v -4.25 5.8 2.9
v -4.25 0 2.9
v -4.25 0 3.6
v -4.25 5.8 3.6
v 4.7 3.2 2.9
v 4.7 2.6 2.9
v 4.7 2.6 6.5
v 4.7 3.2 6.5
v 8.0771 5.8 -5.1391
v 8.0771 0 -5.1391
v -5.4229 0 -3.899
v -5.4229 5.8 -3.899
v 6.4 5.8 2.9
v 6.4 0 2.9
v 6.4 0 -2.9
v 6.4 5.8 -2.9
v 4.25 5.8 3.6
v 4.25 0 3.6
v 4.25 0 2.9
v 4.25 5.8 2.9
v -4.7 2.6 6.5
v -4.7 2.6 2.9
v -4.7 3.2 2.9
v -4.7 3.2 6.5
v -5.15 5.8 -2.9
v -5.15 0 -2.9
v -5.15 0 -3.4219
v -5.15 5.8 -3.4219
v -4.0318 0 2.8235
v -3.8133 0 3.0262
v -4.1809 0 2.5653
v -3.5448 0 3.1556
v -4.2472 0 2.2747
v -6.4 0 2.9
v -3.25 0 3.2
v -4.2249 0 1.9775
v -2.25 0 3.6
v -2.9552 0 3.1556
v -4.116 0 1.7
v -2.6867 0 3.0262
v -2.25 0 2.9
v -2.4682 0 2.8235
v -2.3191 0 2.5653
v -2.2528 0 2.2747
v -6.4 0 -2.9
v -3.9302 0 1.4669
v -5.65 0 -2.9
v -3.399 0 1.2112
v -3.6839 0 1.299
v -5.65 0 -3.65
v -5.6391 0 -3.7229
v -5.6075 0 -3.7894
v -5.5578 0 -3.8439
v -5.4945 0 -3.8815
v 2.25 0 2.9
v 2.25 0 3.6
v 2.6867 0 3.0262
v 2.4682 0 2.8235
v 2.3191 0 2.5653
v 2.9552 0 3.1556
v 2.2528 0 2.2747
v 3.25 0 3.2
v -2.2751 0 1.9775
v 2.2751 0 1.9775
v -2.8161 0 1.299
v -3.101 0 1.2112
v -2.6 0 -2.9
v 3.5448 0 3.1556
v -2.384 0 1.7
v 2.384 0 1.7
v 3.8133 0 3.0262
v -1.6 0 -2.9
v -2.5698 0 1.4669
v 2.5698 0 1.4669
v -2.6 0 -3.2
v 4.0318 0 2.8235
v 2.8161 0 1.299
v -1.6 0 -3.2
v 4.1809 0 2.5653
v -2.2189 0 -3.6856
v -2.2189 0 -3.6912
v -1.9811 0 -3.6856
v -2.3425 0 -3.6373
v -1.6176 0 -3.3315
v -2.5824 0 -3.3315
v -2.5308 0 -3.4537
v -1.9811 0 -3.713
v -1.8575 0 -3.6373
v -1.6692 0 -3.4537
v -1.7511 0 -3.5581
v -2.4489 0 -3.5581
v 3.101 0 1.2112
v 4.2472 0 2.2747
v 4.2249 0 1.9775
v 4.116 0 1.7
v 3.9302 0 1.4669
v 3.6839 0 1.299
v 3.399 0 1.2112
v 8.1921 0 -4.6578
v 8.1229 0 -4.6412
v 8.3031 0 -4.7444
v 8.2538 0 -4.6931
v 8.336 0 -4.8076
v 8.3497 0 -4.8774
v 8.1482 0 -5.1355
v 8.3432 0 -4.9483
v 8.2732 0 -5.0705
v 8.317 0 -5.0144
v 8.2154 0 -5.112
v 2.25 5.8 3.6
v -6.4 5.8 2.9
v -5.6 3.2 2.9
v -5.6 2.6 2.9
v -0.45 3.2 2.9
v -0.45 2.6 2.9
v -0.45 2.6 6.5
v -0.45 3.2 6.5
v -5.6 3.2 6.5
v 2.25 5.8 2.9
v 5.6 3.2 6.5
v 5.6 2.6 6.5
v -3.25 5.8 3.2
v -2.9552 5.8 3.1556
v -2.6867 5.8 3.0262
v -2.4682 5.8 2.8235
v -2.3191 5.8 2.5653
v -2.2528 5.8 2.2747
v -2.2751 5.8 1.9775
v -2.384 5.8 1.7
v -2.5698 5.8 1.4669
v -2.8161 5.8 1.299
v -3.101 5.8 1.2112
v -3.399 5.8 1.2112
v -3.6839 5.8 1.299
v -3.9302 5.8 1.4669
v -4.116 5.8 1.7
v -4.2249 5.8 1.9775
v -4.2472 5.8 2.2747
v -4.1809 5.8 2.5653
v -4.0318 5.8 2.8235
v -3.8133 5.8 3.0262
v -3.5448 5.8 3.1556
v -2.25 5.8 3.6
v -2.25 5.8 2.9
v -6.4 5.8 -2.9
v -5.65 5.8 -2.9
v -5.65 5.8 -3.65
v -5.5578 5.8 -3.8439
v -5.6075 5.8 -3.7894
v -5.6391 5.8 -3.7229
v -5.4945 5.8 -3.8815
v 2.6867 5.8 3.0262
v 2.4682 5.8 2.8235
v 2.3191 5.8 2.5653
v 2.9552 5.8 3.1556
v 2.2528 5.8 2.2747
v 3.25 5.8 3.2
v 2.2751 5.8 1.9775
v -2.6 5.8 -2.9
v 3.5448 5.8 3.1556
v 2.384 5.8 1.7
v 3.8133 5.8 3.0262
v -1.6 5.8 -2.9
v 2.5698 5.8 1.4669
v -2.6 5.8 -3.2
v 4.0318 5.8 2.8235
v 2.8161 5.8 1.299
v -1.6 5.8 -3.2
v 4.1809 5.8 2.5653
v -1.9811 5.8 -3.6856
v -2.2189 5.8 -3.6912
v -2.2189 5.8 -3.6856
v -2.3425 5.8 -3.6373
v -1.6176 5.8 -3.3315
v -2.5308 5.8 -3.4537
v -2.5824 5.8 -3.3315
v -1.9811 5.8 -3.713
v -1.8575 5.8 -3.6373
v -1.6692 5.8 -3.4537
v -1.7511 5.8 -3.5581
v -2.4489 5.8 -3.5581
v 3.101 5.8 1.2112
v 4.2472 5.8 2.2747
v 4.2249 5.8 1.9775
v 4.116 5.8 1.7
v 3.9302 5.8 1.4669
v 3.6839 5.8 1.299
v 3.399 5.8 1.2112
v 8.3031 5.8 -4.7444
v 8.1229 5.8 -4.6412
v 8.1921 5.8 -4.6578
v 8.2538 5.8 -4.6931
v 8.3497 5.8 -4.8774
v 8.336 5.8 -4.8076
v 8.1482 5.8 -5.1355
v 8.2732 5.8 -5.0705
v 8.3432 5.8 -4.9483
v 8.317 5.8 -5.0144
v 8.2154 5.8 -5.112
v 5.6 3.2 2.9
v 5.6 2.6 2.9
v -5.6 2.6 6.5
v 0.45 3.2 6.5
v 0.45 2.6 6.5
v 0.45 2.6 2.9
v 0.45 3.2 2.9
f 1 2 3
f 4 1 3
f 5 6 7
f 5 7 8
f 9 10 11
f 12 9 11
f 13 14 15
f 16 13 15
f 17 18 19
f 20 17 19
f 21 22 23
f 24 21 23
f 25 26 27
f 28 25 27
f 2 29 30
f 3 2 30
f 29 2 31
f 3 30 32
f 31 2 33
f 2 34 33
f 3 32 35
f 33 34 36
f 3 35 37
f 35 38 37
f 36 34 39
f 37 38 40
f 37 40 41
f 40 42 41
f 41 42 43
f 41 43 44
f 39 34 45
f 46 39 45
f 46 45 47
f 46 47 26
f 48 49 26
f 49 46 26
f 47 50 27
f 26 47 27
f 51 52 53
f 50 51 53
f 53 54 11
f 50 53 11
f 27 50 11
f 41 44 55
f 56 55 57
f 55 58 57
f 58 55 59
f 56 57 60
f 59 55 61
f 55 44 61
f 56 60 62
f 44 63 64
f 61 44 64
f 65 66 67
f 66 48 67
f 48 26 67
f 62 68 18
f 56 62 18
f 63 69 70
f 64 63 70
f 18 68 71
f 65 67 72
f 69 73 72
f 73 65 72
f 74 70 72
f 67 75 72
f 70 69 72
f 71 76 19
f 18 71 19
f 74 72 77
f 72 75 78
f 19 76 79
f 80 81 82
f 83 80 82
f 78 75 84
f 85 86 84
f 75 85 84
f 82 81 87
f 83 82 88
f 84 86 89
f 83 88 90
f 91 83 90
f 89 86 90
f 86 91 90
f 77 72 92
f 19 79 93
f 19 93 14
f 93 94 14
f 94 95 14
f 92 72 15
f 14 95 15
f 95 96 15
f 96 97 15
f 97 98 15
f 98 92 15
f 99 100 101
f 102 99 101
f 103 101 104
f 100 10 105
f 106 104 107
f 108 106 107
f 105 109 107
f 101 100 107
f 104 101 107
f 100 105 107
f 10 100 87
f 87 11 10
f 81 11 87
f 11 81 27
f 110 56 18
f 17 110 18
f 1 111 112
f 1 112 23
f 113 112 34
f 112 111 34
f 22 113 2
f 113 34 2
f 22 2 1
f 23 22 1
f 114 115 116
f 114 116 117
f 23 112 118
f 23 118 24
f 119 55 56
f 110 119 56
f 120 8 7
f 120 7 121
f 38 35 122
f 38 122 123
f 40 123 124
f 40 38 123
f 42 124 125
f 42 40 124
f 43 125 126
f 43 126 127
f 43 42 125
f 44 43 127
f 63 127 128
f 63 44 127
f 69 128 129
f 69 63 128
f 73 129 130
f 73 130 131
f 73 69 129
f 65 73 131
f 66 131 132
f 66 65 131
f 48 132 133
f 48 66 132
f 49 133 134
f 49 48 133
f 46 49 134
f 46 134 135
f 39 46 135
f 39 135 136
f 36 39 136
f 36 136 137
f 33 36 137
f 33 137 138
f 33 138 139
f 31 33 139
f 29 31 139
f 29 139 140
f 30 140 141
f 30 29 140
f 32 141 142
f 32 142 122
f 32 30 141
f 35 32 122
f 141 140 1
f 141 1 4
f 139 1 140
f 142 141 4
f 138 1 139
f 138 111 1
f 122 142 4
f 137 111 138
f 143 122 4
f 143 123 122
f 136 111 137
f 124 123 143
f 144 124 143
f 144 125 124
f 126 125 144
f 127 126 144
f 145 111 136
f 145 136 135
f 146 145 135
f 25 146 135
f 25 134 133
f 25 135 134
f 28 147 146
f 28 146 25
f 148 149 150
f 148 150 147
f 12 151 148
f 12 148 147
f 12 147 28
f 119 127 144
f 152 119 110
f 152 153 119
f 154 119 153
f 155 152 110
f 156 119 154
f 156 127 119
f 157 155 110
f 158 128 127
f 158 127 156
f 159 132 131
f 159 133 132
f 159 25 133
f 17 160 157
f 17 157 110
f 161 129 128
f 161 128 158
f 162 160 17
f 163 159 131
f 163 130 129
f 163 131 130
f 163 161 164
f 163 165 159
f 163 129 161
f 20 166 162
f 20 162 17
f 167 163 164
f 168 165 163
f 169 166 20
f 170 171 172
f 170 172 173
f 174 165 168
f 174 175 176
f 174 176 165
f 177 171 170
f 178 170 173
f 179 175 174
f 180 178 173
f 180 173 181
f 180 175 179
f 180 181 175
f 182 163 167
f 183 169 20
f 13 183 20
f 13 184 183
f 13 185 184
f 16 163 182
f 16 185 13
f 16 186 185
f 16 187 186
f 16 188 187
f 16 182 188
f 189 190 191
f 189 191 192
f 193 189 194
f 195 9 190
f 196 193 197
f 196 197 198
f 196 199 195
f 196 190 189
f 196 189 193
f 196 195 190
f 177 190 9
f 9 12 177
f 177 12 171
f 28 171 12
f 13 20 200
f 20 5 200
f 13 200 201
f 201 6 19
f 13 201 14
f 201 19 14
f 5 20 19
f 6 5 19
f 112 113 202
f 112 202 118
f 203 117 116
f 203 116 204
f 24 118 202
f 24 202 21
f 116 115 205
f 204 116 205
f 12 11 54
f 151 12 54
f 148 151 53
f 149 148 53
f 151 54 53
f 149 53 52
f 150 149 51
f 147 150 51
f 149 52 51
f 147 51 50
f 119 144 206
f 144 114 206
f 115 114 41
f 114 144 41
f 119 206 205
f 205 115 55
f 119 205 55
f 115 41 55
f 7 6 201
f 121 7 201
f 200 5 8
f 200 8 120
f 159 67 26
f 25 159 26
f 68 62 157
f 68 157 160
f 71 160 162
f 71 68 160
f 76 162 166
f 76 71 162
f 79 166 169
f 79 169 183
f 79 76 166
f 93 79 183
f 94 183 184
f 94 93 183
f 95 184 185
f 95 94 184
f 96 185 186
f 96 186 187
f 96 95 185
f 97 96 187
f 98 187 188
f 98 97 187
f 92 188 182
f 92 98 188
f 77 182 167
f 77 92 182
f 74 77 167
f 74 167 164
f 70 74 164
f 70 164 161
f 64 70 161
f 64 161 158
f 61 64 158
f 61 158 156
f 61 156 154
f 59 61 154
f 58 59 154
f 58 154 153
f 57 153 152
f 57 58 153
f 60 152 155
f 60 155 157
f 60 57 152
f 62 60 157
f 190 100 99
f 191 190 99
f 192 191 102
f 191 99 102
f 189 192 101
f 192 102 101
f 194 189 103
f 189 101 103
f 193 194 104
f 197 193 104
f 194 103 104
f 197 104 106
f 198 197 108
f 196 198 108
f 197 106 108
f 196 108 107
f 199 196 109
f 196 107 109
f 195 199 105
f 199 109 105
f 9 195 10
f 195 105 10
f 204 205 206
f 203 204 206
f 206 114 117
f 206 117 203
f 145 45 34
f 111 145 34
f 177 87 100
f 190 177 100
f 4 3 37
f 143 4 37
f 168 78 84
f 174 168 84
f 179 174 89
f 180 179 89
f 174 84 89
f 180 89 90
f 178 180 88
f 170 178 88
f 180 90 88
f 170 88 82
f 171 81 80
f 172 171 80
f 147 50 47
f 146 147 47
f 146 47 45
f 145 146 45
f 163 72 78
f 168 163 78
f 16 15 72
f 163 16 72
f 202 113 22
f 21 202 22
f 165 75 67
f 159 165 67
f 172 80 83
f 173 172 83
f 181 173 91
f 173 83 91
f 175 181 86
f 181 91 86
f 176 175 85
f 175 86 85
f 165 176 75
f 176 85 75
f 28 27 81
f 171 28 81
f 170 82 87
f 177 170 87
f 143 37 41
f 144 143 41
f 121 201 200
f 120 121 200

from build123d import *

# Parameters (mm, degrees)
SKETCH1_R           = 1
BOSS_EXTRUDE1_DEPTH = 5.8
SKETCH3_W           = 0.9
SKETCH3_H           = 0.6
BOSS_EXTRUDE2_DEPTH = 3.6


with BuildPart() as part:
    # Sketch1 → Boss-Extrude1 (new body)
    with BuildSketch(Plane(origin=(0, 0, 0), x_dir=(1, 0, 0), z_dir=(0, 1, 0))):
        with BuildLine():
            ThreePointArc((-1.6, 3.2), (-1.7066364, 3.508650414), (-1.981060312, 3.685647352))
            Line((-1.981060312, 3.685647352), (-1.981060312, 3.713031937))
            Line((-1.981060312, 3.713031937), (8.122870222, 4.641240594))
            ThreePointArc((8.122870222, 4.641240594), (8.348951708, 4.913062524), (8.077129778, 5.13914401))
            Line((8.077129778, 5.13914401), (-5.422870222, 3.898951708))
            ThreePointArc((-5.422870222, 3.898951708), (-5.584685619, 3.81849695), (-5.65, 3.65))
            Line((-5.65, 3.65), (-5.65, 2.9))
            Line((-5.65, 2.9), (-6.4, 2.9))
            Line((-6.4, 2.9), (-6.4, -2.9))
            Line((-6.4, -2.9), (-4.25, -2.9))
            Line((-4.25, -2.9), (-4.25, -3.6))
            Line((-4.25, -3.6), (-2.25, -3.6))
            Line((-2.25, -3.6), (-2.25, -2.9))
            Line((-2.25, -2.9), (2.25, -2.9))
            Line((2.25, -2.9), (2.25, -3.6))
            Line((2.25, -3.6), (4.25, -3.6))
            Line((4.25, -3.6), (4.25, -2.9))
            Line((4.25, -2.9), (6.4, -2.9))
            Line((6.4, -2.9), (6.4, 2.9))
            Line((6.4, 2.9), (-1.6, 2.9))
            Line((-1.6, 2.9), (-1.6, 3.2))
        make_face()
        with Locations(Location((-3.25, -2.2, 0), (0, 0, 270))):
            Circle(SKETCH1_R, mode=Mode.SUBTRACT)
        with Locations(Location((3.25, -2.2, 0), (0, 0, 270))):
            Circle(SKETCH1_R, mode=Mode.SUBTRACT)
        with BuildLine():
            Line((-2.218939688, 3.691178887), (-2.218939688, 3.685647352))
            ThreePointArc((-2.218939688, 3.685647352), (-2.4933636, 3.508650414), (-2.6, 3.2))
            Line((-2.6, 3.2), (-2.6, 2.9))
            Line((-2.6, 2.9), (-5.15, 2.9))
            Line((-5.15, 2.9), (-5.15, 3.421913818))
            Line((-5.15, 3.421913818), (-2.218939688, 3.691178887))
        make_face(mode=Mode.SUBTRACT)
    extrude(amount=BOSS_EXTRUDE1_DEPTH)

    # Sketch3 → Boss-Extrude2 (add)
    with BuildSketch(Plane.XY.offset(2.9)):
        with Locations((-5.15, 2.9)):
            Rectangle(SKETCH3_W, SKETCH3_H)
        with Locations((0, 2.9)):
            Rectangle(SKETCH3_W, SKETCH3_H)
        with Locations((5.15, 2.9)):
            Rectangle(SKETCH3_W, SKETCH3_H)
    extrude(amount=BOSS_EXTRUDE2_DEPTH)


solid = part.part
